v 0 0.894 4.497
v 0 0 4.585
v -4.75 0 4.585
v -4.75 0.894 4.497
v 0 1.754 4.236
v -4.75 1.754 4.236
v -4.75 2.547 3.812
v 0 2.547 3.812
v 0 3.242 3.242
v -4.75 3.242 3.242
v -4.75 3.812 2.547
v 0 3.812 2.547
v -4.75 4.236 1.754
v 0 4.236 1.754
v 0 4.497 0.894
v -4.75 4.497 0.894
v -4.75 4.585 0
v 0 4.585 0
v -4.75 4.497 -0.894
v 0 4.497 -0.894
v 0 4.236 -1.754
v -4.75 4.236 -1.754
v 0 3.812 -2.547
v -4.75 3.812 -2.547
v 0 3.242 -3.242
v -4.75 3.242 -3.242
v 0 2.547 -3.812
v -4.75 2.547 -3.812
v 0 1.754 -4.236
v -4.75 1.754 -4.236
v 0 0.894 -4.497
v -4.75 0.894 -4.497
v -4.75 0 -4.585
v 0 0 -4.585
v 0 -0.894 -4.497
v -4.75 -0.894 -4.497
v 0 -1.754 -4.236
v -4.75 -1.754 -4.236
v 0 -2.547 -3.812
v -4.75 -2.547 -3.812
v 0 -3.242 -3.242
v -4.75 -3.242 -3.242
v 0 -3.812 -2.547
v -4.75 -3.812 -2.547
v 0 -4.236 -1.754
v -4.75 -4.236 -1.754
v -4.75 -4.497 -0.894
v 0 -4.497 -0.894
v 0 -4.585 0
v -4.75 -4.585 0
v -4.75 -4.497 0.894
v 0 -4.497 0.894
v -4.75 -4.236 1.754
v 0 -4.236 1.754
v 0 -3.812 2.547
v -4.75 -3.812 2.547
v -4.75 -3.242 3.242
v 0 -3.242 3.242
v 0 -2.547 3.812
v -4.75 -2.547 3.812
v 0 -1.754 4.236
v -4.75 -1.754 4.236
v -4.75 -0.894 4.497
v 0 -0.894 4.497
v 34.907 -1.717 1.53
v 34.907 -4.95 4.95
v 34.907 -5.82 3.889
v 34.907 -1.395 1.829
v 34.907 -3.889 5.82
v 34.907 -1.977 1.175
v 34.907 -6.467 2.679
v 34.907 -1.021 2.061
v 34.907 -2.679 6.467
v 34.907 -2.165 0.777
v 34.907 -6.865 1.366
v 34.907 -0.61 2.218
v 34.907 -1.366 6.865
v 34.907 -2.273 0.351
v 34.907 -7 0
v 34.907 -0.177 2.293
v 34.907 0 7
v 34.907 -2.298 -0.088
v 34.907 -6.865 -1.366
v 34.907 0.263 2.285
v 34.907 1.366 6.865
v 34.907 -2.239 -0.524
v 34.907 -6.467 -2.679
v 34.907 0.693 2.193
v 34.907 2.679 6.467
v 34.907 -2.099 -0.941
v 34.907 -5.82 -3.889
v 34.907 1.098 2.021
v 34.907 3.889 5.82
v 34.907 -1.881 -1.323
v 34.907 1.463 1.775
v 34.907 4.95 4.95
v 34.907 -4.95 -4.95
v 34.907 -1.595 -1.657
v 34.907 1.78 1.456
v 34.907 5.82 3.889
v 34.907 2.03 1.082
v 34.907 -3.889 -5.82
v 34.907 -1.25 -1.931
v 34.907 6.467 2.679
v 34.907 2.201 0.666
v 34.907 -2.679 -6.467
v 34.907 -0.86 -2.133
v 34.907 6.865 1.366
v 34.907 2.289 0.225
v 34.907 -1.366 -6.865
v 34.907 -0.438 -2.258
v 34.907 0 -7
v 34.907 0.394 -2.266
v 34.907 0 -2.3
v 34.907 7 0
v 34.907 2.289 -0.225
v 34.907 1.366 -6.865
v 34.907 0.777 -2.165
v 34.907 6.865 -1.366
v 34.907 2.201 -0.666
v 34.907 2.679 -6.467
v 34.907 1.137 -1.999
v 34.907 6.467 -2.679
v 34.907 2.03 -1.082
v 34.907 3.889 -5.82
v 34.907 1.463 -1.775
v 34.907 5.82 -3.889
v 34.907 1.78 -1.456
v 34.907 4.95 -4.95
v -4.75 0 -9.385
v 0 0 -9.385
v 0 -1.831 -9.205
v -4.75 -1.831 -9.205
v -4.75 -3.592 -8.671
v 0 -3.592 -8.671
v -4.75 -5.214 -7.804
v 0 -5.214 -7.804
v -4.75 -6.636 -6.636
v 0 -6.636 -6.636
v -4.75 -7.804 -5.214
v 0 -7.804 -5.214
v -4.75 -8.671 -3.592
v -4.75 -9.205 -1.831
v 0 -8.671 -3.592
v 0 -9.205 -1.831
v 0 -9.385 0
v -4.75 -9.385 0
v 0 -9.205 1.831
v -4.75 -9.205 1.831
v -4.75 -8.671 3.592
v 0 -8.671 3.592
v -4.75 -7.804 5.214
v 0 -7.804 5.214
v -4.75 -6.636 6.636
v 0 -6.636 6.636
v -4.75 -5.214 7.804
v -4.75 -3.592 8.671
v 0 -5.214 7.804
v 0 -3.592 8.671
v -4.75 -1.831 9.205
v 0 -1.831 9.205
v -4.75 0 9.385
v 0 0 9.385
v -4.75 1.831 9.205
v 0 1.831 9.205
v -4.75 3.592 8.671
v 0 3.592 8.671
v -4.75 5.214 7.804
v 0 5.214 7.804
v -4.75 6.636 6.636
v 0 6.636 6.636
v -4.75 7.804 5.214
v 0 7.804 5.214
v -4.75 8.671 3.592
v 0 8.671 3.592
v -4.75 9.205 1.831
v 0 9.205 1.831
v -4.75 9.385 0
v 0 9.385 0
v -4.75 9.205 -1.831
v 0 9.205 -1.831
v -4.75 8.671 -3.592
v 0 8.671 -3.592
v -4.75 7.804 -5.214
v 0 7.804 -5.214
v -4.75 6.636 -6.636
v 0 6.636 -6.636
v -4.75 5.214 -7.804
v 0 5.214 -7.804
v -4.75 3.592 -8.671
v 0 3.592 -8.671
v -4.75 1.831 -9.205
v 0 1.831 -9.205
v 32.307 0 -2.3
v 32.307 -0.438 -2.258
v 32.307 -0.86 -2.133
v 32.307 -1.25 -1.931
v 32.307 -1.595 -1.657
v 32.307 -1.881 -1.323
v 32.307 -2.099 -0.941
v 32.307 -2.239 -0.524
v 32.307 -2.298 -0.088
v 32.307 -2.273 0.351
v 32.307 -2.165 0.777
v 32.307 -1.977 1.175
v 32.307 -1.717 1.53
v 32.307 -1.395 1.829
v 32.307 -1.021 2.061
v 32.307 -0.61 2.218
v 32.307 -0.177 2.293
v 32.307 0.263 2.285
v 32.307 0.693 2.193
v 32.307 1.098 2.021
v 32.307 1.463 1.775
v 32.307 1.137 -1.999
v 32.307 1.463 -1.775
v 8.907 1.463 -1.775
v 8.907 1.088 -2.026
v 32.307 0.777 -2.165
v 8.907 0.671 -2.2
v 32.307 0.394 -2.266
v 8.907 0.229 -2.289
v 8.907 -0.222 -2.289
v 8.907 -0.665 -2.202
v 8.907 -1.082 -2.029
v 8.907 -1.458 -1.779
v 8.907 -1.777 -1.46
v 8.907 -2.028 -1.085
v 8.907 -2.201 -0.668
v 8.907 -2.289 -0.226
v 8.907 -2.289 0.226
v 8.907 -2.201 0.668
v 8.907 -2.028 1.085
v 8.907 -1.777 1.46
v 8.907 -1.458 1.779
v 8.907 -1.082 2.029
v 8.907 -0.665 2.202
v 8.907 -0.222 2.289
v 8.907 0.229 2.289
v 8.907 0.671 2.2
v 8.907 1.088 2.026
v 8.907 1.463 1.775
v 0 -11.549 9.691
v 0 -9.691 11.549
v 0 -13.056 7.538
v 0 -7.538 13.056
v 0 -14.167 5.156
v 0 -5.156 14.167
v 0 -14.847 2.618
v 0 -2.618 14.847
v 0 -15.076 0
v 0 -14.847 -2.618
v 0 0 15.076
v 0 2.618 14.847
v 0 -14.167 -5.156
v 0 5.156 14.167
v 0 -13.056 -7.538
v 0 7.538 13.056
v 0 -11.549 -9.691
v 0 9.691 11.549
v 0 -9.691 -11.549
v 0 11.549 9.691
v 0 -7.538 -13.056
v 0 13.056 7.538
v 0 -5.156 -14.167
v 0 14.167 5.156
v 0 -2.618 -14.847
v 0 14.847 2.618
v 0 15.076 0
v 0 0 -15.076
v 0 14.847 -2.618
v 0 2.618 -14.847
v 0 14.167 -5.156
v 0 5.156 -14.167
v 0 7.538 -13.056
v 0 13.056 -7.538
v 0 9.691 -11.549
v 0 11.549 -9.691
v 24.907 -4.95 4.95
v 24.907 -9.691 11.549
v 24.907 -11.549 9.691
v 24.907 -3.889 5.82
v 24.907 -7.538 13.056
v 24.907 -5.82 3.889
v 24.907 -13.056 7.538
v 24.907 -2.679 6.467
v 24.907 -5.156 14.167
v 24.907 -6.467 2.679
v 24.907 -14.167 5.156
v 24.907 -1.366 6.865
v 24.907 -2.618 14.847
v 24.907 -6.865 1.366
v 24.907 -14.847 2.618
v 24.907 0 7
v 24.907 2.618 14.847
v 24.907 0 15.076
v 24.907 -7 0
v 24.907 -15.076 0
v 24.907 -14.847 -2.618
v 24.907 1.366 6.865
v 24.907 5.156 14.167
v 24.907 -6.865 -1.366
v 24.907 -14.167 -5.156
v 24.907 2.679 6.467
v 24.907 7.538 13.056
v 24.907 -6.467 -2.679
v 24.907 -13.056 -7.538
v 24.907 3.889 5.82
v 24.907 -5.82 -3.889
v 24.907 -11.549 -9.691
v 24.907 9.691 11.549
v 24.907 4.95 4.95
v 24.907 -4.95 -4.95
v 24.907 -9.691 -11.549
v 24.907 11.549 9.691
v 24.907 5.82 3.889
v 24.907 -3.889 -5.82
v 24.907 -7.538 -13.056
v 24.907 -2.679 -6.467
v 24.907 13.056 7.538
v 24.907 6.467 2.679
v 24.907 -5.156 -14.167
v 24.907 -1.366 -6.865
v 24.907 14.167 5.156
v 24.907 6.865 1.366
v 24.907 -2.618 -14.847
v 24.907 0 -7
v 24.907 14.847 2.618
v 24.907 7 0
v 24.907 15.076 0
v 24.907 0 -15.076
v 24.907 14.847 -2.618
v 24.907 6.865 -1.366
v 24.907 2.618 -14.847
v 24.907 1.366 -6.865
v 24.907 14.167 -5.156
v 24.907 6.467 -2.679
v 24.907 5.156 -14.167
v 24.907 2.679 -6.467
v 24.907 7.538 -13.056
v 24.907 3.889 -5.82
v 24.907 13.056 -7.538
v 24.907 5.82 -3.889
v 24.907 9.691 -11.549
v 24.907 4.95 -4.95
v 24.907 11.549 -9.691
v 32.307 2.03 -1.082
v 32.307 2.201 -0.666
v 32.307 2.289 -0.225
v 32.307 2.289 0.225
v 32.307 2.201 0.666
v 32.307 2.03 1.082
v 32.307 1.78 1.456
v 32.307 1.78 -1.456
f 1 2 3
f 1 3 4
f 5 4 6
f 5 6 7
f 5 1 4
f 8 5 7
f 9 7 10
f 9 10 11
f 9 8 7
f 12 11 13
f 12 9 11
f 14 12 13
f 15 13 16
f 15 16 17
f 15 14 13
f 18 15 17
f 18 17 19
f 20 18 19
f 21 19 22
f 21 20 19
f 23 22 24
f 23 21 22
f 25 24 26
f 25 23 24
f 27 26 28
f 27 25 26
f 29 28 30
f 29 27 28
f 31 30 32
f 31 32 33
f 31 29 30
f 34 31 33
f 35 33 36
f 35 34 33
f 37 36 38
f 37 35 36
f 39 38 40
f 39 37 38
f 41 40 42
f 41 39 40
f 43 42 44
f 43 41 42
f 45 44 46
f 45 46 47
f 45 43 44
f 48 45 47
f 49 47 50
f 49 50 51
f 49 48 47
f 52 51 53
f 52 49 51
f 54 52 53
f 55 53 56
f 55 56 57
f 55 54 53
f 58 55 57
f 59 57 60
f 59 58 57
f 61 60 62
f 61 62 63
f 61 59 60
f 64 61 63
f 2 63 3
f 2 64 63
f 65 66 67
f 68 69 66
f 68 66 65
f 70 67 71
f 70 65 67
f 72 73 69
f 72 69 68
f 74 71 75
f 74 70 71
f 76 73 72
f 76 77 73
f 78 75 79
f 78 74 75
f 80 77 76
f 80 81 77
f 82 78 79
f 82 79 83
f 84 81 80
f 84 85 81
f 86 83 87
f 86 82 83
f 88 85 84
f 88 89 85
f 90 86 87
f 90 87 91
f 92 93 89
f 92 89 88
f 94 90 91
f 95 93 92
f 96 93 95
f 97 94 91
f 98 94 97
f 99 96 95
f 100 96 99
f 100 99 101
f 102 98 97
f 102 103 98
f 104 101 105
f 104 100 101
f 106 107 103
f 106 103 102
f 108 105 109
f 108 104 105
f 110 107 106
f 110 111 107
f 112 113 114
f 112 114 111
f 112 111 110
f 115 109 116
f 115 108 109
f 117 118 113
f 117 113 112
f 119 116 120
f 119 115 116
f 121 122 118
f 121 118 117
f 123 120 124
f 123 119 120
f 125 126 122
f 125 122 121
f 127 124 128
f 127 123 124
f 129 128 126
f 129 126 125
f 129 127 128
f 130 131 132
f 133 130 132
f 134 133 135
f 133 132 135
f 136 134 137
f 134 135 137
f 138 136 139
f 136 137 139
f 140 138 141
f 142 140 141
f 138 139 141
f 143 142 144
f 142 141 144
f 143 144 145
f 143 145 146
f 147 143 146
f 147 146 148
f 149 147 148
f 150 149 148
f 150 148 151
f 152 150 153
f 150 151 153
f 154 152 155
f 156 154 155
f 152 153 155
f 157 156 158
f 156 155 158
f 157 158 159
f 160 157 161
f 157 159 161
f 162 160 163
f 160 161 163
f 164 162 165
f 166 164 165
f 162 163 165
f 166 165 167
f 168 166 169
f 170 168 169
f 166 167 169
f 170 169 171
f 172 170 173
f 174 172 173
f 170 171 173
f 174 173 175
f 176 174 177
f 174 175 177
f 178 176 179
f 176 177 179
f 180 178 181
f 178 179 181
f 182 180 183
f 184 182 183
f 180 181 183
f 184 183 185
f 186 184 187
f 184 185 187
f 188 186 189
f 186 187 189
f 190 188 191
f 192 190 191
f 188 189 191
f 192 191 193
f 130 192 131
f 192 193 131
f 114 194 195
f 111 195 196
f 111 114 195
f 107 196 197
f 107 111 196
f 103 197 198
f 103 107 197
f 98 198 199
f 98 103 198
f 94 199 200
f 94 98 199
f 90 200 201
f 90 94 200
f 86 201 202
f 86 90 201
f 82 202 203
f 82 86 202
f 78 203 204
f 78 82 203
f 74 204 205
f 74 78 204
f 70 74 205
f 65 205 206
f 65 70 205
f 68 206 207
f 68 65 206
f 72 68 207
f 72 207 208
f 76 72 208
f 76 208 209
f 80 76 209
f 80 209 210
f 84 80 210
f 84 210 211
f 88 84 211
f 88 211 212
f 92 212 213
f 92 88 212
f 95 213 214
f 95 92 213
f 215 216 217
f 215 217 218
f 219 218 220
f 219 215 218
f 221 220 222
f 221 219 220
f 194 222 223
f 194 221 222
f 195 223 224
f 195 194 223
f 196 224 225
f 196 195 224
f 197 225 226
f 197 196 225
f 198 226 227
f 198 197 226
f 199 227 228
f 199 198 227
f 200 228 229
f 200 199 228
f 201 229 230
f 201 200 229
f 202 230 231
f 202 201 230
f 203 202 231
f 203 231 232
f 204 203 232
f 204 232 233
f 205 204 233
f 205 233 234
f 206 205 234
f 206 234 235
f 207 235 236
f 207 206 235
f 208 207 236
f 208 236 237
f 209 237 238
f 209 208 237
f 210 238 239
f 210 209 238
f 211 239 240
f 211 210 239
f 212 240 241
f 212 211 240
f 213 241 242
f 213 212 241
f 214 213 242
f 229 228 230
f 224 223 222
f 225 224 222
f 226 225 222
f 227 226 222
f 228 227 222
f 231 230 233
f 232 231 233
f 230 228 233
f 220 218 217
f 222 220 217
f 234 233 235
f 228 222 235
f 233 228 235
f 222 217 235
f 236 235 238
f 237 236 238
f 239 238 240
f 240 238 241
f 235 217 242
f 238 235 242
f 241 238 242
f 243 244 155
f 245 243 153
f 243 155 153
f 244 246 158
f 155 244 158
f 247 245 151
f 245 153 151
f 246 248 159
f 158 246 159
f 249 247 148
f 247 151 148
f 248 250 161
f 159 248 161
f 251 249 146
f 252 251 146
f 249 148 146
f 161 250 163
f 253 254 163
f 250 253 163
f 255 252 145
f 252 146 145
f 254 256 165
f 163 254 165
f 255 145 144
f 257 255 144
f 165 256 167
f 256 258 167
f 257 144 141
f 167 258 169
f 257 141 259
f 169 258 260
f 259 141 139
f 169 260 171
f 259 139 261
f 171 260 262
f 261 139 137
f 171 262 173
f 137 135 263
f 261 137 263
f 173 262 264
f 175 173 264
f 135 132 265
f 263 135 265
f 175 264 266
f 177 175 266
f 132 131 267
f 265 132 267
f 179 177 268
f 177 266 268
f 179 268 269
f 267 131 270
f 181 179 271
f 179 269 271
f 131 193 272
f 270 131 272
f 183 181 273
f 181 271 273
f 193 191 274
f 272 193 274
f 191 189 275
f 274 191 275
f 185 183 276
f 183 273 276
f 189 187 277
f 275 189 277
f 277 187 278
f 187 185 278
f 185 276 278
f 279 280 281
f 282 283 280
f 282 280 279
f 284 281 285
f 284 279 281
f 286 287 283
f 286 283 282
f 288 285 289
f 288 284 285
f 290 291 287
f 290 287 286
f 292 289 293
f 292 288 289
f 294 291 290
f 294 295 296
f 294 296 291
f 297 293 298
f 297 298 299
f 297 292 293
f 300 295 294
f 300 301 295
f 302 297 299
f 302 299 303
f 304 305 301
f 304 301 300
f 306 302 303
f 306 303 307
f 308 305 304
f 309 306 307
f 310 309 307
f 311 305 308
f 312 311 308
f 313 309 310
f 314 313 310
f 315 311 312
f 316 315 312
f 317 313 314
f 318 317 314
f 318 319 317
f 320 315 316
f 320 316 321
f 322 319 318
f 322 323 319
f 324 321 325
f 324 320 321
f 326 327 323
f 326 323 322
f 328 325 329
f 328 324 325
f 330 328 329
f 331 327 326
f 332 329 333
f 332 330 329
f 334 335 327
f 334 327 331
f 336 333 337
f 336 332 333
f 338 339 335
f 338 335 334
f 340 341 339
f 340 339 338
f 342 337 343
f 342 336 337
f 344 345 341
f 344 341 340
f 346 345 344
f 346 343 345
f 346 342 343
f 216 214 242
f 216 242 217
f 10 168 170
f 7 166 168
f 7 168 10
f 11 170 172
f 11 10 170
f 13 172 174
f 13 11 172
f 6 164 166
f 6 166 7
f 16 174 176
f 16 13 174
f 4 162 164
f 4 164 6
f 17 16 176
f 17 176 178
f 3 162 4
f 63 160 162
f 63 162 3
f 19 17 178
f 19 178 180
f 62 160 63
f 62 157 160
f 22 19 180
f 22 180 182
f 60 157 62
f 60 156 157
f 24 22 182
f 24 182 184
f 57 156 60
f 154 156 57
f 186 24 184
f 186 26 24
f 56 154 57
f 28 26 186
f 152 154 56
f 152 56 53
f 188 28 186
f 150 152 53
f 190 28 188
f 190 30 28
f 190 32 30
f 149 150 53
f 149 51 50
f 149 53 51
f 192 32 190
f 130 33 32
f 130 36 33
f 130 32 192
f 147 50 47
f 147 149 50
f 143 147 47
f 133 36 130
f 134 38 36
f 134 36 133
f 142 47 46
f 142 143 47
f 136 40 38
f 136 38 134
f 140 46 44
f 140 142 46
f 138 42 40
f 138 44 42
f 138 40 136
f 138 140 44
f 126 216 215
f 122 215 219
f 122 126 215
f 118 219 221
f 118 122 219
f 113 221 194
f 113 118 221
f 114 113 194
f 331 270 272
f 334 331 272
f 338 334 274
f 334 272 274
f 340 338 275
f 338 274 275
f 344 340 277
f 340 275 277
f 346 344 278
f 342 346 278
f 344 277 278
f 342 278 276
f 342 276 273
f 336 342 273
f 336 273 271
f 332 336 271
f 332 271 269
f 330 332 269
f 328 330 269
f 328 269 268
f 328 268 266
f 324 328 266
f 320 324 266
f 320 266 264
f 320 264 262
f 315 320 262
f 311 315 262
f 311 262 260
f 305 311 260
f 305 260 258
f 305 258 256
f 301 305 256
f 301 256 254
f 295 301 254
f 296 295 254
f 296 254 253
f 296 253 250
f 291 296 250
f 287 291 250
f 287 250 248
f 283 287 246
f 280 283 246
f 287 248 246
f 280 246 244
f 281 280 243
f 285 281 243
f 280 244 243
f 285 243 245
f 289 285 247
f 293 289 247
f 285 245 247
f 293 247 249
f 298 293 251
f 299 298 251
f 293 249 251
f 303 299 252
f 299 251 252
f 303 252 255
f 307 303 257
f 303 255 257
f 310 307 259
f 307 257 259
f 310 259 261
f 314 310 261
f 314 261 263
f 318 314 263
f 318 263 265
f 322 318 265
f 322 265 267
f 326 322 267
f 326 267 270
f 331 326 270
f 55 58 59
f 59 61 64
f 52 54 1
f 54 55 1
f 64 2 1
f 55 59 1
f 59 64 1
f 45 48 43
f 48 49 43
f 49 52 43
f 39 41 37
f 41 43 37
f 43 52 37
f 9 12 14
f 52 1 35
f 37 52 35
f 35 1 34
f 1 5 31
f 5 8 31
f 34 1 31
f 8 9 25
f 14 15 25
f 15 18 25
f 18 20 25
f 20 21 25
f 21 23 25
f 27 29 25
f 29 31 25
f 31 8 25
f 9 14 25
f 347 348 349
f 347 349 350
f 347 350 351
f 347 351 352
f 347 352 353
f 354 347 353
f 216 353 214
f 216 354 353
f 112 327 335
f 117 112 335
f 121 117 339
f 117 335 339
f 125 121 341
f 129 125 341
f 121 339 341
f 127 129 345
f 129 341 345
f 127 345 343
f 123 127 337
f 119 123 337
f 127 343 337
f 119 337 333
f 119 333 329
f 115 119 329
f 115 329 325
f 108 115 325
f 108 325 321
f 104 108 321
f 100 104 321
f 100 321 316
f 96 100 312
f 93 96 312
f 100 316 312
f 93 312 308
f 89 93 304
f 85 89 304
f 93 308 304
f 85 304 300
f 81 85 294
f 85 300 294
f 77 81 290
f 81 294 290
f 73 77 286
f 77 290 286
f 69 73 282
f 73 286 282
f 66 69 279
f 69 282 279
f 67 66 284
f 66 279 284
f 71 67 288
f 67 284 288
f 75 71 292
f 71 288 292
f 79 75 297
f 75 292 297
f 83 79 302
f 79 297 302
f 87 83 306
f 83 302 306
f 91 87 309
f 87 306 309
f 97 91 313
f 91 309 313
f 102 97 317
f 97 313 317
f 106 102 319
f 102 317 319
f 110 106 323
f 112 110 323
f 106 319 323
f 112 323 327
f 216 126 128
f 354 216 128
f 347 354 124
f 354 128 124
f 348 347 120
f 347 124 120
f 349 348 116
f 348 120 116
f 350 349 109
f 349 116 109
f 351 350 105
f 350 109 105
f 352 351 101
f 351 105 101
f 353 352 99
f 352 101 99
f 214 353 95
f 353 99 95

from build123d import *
from build123d.topology import SkipClean

# Parameters (mm, degrees)
SKETCH1_R           = 15.07617
BOSS_EXTRUDE1_DEPTH = 34.9071592
SKETCH2_R           = 9.3853
SKETCH2_R_2         = 4.5847
BOSS_EXTRUDE2_DEPTH = 4.7498
CUT_EXTRUDE1_DEPTH  = 26
SKETCH4_R           = 2.3
CUT_EXTRUDE2_DEPTH  = 2.6
CUT_EXTRUDE3_START  = -10
SKETCH5_R           = 15.07617
SKETCH5_R_2         = 7
CUT_EXTRUDE3_DEPTH  = 10


with BuildPart() as part:
    # Sketch1 → Boss-Extrude1 (new body)
    with BuildSketch(Plane(origin=(0, 0, 0), x_dir=(0, 0, -1), z_dir=(1, 0, 0))):
        Circle(SKETCH1_R)
    extrude(amount=BOSS_EXTRUDE1_DEPTH)

    # Sketch2 → Boss-Extrude2 (add)
    with BuildSketch(Plane.ZY):
        with Locations(Location((0, 0, 0), (0, 0, 180))):
            Circle(SKETCH2_R)
        Circle(SKETCH2_R_2, mode=Mode.SUBTRACT)
    extrude(amount=BOSS_EXTRUDE2_DEPTH)

    # Sketch3 → Cut-Extrude1 (cut)
    with BuildSketch(Plane(origin=(34.9071592, 0, 0), x_dir=(0, 0, -1), z_dir=(1, 0, 0))):
        with BuildLine():
            Line((-1.775, 1.462660248), (1.775, 1.462660248))
            ThreePointArc((1.775, 1.462660248), (0, -2.3), (-1.775, 1.462660248))
        make_face()
    extrude(amount=-CUT_EXTRUDE1_DEPTH, mode=Mode.SUBTRACT)

    # Sketch4 → Cut-Extrude2 (cut)
    with SkipClean():  # the faces are left unmerged after this step: merging them gives an invalid solid
        with BuildSketch(Plane(origin=(34.9071592, 0, 0), x_dir=(0, 0, -1), z_dir=(1, 0, 0))):
            Circle(SKETCH4_R)
        extrude(amount=-CUT_EXTRUDE2_DEPTH, mode=Mode.SUBTRACT)

    # Sketch5 → Cut-Extrude3 (cut)
    with SkipClean():  # the faces are left unmerged after this step: merging them gives an invalid solid
        with BuildSketch(Plane(origin=(34.9071592, 0, 0), x_dir=(0, 0, -1), z_dir=(1, 0, 0)).offset(CUT_EXTRUDE3_START)):
            Circle(SKETCH5_R)
            Circle(SKETCH5_R_2, mode=Mode.SUBTRACT)
        extrude(amount=CUT_EXTRUDE3_DEPTH, mode=Mode.SUBTRACT)


solid = part.part
